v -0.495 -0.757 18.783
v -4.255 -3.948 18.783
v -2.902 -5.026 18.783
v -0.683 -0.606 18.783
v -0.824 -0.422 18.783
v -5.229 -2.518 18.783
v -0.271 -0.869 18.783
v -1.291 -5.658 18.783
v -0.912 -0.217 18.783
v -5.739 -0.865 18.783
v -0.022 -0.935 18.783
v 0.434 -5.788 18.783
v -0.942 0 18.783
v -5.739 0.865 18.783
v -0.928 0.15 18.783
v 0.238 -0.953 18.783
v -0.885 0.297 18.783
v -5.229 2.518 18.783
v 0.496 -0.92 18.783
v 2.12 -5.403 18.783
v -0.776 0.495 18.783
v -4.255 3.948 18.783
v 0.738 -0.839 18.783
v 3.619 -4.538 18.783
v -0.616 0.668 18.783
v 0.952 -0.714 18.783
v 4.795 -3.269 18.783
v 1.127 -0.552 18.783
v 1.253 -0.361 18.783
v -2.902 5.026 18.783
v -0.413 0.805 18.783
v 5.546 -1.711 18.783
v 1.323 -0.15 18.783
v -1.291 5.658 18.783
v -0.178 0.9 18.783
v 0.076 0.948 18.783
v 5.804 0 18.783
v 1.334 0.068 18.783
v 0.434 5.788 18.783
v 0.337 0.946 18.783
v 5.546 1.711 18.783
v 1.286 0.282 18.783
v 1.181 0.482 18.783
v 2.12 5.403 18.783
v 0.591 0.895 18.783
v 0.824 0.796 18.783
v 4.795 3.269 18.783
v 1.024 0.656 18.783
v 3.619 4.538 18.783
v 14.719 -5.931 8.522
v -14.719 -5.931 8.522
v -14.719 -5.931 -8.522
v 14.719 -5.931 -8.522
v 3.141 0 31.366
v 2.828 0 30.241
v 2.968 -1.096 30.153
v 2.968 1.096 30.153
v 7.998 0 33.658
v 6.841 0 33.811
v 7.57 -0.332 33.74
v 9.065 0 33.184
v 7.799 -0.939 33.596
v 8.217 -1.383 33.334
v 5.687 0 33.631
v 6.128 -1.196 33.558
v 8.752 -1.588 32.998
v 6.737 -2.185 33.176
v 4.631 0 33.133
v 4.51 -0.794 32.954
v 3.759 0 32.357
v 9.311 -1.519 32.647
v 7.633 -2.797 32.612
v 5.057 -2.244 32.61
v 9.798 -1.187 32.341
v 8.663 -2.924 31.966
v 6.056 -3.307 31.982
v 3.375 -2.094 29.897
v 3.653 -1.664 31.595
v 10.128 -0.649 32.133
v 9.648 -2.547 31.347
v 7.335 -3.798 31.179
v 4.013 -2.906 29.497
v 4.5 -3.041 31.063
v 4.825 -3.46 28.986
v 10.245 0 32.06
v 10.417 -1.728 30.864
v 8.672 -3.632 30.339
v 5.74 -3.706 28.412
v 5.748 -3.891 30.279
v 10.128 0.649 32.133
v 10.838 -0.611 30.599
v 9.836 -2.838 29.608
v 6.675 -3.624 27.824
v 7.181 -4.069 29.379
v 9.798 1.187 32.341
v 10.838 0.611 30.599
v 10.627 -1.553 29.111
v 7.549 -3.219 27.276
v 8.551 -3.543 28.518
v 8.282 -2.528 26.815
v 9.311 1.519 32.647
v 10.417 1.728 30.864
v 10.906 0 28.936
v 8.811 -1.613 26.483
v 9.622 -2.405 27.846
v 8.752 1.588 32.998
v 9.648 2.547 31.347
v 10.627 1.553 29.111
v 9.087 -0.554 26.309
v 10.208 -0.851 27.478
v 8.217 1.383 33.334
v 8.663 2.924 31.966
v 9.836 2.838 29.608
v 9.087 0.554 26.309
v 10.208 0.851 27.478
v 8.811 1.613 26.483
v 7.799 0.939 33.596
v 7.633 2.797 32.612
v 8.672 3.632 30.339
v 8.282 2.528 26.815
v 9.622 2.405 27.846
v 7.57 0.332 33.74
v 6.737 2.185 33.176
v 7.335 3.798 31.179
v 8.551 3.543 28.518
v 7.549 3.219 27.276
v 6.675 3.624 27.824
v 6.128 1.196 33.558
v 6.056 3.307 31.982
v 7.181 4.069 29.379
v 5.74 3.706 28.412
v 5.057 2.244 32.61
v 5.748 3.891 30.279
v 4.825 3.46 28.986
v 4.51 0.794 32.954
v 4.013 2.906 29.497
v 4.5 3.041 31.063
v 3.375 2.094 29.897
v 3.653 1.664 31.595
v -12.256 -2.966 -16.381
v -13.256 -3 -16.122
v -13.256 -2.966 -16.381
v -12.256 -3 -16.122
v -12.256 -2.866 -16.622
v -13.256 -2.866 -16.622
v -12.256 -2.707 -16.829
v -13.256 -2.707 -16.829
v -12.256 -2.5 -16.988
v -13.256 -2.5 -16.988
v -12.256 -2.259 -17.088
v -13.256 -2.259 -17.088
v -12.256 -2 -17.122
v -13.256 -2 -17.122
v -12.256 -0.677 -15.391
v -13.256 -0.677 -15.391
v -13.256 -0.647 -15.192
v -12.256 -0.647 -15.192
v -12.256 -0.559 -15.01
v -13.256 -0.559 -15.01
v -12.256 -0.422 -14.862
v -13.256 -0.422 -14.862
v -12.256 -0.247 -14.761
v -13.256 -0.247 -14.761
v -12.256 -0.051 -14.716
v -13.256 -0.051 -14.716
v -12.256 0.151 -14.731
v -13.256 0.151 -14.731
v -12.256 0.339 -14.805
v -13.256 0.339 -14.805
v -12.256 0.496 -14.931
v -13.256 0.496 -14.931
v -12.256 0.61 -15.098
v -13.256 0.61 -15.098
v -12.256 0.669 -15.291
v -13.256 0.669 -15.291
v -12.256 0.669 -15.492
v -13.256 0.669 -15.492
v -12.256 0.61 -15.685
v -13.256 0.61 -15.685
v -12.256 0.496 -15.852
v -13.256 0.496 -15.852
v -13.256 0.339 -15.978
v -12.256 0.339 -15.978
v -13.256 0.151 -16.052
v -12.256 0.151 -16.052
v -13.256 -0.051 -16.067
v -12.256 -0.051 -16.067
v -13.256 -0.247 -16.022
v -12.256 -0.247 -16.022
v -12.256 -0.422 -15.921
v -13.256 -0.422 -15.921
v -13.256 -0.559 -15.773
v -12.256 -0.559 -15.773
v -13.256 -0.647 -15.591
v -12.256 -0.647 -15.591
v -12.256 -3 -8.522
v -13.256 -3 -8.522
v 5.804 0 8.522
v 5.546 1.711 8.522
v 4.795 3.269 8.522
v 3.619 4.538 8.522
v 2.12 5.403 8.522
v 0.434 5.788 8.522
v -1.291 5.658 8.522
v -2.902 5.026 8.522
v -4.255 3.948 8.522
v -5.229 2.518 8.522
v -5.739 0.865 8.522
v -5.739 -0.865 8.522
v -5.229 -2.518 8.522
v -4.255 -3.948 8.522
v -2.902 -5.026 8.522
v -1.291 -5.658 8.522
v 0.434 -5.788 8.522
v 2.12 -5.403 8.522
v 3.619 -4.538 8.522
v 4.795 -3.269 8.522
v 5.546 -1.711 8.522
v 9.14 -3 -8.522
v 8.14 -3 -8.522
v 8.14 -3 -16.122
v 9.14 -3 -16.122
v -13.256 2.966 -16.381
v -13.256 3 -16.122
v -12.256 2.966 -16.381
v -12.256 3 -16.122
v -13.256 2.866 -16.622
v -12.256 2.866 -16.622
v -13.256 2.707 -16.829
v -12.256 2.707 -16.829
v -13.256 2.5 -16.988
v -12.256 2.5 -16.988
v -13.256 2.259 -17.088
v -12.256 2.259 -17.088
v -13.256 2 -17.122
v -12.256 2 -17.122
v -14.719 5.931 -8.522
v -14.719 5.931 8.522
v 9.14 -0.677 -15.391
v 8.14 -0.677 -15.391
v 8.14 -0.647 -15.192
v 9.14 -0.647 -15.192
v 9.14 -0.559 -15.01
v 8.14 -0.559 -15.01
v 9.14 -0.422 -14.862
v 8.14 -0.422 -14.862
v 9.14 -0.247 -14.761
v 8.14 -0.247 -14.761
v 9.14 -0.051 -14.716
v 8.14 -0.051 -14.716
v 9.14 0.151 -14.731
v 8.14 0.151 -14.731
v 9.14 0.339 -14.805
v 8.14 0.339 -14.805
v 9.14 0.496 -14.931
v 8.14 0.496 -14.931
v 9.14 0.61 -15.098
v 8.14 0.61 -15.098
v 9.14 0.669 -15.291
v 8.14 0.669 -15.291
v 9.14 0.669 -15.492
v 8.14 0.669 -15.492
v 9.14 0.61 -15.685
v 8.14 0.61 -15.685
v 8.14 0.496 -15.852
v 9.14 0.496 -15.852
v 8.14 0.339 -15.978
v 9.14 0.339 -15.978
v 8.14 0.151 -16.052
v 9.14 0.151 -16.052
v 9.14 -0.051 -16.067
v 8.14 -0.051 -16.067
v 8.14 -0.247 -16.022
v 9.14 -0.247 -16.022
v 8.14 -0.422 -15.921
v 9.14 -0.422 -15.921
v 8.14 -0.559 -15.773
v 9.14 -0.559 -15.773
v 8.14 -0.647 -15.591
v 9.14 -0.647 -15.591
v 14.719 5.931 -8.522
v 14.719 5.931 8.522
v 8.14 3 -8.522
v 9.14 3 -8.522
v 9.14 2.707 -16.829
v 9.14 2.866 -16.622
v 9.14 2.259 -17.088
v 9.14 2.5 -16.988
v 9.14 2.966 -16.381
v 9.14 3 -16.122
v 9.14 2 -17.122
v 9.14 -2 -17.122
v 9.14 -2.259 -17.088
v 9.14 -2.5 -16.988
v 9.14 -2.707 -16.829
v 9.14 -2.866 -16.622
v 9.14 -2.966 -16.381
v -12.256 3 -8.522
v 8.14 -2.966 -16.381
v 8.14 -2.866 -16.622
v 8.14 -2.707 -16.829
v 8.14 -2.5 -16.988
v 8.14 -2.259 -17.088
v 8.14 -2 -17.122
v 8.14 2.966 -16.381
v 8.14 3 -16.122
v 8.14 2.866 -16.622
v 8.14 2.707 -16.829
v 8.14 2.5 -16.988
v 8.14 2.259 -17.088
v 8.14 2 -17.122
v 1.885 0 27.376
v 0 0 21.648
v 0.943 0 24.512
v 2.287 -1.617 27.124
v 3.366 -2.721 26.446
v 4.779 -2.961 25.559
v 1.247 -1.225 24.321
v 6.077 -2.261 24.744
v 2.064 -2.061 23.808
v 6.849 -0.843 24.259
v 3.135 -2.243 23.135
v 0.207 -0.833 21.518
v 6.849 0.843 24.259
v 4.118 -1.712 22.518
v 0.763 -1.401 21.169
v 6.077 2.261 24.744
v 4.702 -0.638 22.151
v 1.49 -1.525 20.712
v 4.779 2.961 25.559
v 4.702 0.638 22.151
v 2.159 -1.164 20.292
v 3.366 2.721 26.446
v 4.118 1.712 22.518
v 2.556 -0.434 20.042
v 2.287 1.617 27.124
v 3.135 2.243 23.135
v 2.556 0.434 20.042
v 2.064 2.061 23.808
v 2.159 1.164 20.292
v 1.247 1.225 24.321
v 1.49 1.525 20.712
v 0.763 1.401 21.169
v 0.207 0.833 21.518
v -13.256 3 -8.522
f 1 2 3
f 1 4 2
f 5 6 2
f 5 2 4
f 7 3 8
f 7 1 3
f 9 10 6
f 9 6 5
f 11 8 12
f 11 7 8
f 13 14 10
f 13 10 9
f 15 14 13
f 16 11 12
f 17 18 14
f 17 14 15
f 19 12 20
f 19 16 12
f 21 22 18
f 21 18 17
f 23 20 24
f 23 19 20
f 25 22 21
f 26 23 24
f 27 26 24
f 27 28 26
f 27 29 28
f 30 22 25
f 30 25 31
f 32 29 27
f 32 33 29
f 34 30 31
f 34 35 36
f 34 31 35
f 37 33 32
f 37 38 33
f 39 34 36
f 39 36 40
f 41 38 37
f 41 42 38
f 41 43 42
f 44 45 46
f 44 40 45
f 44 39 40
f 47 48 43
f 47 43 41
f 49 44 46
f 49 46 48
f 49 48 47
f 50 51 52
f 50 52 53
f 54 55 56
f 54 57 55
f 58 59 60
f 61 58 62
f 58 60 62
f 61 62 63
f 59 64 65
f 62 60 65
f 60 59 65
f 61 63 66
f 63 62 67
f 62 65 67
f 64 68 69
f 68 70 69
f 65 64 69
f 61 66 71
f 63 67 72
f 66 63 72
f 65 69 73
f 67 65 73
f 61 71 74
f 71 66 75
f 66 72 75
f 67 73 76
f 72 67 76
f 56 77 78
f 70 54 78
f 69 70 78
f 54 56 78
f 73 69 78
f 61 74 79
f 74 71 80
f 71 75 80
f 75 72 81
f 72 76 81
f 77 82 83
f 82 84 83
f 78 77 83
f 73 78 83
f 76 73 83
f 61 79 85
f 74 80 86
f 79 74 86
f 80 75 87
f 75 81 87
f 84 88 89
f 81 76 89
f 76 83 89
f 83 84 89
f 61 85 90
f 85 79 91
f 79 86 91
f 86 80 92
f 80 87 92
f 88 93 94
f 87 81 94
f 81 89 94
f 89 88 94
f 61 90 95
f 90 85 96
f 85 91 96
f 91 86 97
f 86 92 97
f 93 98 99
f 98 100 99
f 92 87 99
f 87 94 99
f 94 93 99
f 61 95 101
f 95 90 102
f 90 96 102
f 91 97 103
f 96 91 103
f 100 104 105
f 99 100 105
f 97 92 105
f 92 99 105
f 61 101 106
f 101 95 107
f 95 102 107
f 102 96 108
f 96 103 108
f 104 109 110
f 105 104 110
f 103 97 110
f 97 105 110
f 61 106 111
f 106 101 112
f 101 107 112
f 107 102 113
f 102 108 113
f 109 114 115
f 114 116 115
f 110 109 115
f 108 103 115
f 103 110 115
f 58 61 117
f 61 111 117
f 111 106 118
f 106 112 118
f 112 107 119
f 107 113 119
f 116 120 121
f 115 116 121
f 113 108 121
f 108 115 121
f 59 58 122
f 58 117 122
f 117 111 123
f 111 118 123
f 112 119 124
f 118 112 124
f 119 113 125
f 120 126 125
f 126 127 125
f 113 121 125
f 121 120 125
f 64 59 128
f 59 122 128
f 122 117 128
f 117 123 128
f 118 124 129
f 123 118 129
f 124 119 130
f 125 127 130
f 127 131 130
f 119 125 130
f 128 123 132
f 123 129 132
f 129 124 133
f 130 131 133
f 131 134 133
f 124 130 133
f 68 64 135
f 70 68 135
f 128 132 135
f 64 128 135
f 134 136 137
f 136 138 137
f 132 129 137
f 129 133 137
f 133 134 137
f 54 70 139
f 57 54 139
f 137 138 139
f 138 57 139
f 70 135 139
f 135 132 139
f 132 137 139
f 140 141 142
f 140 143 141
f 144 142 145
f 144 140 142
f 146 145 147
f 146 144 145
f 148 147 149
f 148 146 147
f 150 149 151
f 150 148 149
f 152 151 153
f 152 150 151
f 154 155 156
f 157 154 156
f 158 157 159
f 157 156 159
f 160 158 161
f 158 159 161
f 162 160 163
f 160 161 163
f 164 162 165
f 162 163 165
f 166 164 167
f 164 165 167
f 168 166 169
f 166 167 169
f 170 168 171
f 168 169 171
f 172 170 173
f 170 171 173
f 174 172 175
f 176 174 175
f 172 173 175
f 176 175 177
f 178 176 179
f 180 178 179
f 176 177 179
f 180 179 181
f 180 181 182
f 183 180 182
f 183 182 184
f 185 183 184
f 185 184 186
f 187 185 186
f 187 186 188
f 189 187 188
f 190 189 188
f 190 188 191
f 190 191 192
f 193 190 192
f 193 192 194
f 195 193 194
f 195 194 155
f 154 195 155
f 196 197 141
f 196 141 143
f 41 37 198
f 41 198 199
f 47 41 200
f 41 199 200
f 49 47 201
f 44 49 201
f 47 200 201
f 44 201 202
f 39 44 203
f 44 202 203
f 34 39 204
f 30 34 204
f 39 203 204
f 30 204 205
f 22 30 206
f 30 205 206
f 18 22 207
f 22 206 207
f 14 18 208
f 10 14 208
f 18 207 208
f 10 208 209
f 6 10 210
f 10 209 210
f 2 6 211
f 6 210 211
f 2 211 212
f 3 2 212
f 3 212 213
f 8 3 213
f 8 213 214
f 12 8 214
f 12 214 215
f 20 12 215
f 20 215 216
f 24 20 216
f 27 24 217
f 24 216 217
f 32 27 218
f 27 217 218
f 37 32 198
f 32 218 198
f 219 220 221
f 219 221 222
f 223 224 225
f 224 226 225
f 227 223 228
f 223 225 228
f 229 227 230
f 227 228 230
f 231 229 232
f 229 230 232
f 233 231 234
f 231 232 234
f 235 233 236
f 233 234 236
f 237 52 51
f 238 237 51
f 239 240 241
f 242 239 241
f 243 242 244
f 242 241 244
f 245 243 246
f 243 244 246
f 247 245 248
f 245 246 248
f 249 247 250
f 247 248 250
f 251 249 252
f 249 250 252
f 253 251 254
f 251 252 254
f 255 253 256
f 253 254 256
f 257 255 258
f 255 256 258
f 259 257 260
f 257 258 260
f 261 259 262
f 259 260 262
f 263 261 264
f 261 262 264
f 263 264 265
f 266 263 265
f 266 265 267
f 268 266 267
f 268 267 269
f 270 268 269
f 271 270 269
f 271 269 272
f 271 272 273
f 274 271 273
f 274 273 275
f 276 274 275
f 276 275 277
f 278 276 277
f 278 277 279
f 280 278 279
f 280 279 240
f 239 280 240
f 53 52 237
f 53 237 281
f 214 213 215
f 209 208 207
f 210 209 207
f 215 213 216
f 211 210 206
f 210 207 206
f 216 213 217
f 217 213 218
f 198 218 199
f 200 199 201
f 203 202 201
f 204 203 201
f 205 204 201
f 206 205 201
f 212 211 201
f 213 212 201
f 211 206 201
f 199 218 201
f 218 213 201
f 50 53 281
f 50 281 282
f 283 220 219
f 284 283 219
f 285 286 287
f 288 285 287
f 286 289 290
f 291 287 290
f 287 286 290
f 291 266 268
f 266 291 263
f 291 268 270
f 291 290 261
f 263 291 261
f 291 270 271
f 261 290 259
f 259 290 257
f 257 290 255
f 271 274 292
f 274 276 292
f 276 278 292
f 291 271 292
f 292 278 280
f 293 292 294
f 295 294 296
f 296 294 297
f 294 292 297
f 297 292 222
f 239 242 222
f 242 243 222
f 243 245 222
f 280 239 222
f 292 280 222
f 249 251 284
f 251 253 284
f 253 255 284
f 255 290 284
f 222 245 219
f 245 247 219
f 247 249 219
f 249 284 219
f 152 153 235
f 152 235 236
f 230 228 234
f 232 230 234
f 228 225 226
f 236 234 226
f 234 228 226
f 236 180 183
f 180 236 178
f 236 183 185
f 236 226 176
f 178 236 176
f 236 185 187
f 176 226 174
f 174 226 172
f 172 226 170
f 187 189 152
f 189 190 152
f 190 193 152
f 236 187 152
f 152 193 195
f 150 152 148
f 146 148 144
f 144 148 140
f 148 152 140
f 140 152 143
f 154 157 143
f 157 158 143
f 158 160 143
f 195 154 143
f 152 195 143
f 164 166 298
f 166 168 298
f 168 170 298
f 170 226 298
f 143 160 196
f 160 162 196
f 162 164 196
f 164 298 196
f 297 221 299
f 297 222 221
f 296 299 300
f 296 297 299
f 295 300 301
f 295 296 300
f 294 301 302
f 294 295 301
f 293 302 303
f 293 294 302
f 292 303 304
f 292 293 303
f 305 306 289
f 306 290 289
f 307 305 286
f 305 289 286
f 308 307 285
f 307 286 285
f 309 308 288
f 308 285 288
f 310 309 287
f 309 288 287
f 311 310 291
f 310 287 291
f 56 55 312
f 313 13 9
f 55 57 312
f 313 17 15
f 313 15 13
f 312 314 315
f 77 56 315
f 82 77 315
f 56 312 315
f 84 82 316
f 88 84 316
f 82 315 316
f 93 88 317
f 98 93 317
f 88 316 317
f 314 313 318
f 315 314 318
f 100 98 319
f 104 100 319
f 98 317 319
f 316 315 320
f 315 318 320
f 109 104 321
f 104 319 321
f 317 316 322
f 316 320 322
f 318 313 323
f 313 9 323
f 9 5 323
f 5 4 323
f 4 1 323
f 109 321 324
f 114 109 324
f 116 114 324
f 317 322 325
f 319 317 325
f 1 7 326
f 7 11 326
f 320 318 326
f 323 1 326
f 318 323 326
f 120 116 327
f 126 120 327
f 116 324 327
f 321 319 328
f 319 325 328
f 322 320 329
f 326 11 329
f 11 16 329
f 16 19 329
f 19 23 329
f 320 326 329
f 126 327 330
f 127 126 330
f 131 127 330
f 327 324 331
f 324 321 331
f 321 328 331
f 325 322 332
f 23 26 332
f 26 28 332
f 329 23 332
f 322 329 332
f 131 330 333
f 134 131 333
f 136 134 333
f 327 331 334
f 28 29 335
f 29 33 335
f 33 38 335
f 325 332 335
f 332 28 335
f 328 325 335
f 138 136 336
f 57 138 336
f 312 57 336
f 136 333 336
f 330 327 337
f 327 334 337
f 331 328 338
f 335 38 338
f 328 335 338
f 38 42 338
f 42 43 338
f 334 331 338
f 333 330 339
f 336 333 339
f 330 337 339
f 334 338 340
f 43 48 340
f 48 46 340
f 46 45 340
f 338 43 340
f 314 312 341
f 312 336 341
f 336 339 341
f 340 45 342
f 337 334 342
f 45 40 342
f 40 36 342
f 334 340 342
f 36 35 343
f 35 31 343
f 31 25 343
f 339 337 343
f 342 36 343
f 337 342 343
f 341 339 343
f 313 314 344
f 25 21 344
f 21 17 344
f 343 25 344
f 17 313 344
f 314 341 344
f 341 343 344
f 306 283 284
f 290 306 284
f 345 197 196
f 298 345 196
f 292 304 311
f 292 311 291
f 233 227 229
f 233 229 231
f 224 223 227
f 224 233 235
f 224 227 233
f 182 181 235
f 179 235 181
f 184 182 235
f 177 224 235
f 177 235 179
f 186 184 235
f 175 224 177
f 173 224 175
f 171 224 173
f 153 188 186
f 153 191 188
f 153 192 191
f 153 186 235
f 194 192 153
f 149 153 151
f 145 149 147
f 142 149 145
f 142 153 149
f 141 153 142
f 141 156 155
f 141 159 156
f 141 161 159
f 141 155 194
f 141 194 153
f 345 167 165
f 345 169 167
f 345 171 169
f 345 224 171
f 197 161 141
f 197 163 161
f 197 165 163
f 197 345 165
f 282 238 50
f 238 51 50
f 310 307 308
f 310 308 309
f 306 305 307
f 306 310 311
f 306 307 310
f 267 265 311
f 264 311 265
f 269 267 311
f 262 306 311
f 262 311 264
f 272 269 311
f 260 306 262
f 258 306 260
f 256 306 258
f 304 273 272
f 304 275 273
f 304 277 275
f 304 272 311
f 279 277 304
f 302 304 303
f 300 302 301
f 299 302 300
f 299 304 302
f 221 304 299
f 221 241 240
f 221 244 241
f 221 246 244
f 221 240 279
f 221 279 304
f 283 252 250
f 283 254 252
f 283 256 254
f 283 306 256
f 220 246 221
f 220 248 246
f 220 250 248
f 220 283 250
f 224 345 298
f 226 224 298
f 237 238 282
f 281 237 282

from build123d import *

# Parameters (mm, degrees)
F0_W      = 29.4386
F0_H      = 17.0434
F1_DEPTH  = 5.9309
F2_R      = 5.8039
F3_DEPTH  = 10.2616
F6_W      = 1
F6_H      = 6
F7_DEPTH  = 8.6
F8_R      = 1
F8_2_R    = 1
F9_R      = 0.6770222616
F10_DEPTH = 500


with BuildPart() as f1:
    # F0 (on Front) → F1 (new body, symmetric)
    with BuildSketch(Plane.XZ):
        Rectangle(F0_W, F0_H)
    extrude(amount=F1_DEPTH, both=True)


with BuildPart() as f3:
    # F2 (on face) → F3 (new body)
    with BuildSketch(Plane.XY.offset(8.5217)):
        Circle(F2_R)
    extrude(amount=F3_DEPTH)

    # F4 (on Front) → F5 (revolve)
    with BuildSketch(Plane.XZ):
        with BuildLine():
            Line((-0.9526929156, 18.7513008714), (0, 18.7513008714))
            Line((0, 18.7513008714), (9.0653166076, 33.1838168809))
            ThreePointArc((9.0653166076, 33.1838168809), (5.141054484, 33.4195512623), (2.8277341607, 30.2408796852))
            Line((2.8277341607, 30.2408796852), (-0.9526929156, 18.7513008714))
        make_face()
    revolve(axis=Axis((4.5326583038, 0, 25.9675588761), (0.5318960188, 0, 0.8468096747)))


with BuildPart() as f7:
    # F6 (on face) → F7 (new body)
    with BuildSketch(Plane(origin=(0, 0, -8.5217), x_dir=(1, 0, 0), z_dir=(0, 0, -1))):
        with Locations((8.6395833641, 0)):
            Rectangle(F6_W, F6_H)
    extrude(amount=F7_DEPTH)

    # F8
    f8_edges = [f7.edges().sort_by_distance(p)[0] for p in [
        (8.639583, 3, -17.1217),
        (8.639583, -3, -17.1217),
    ]]
    fillet(f8_edges, radius=F8_R)


with BuildPart() as f7b:
    # F6 (on face) → F7, piece 2 (new body)
    with BuildSketch(Plane(origin=(0, 0, -8.5217), x_dir=(1, 0, 0), z_dir=(0, 0, -1))):
        with Locations((-12.7559127286, 0)):
            Rectangle(F6_W, F6_H)
    extrude(amount=F7_DEPTH)

    # F8#2
    f8_2_edges = [f7b.edges().sort_by_distance(p)[0] for p in [
        (-12.755913, -3, -17.1217),
        (-12.755913, 3, -17.1217),
    ]]
    fillet(f8_2_edges, radius=F8_2_R)


with BuildPart() as f10_tool:
    # F9 (on face) → F10 (new body)
    with BuildSketch(Plane(origin=(-13.2559127286, 0, 0), x_dir=(0, -1, 0), z_dir=(-1, 0, 0))):
        with Locations((0, -15.3914736584)):
            Circle(F9_R)
    extrude(amount=-F10_DEPTH)


with BuildPart() as f7_1:
    add(f7.part)

    # F10: cut by f10_tool
    add(f10_tool.part, mode=Mode.SUBTRACT)


with BuildPart() as f7b_1:
    add(f7b.part)

    # F10: cut by f10_tool
    add(f10_tool.part, mode=Mode.SUBTRACT)


solid = Compound([f1.part, f3.part, f7_1.part, f7b_1.part])
